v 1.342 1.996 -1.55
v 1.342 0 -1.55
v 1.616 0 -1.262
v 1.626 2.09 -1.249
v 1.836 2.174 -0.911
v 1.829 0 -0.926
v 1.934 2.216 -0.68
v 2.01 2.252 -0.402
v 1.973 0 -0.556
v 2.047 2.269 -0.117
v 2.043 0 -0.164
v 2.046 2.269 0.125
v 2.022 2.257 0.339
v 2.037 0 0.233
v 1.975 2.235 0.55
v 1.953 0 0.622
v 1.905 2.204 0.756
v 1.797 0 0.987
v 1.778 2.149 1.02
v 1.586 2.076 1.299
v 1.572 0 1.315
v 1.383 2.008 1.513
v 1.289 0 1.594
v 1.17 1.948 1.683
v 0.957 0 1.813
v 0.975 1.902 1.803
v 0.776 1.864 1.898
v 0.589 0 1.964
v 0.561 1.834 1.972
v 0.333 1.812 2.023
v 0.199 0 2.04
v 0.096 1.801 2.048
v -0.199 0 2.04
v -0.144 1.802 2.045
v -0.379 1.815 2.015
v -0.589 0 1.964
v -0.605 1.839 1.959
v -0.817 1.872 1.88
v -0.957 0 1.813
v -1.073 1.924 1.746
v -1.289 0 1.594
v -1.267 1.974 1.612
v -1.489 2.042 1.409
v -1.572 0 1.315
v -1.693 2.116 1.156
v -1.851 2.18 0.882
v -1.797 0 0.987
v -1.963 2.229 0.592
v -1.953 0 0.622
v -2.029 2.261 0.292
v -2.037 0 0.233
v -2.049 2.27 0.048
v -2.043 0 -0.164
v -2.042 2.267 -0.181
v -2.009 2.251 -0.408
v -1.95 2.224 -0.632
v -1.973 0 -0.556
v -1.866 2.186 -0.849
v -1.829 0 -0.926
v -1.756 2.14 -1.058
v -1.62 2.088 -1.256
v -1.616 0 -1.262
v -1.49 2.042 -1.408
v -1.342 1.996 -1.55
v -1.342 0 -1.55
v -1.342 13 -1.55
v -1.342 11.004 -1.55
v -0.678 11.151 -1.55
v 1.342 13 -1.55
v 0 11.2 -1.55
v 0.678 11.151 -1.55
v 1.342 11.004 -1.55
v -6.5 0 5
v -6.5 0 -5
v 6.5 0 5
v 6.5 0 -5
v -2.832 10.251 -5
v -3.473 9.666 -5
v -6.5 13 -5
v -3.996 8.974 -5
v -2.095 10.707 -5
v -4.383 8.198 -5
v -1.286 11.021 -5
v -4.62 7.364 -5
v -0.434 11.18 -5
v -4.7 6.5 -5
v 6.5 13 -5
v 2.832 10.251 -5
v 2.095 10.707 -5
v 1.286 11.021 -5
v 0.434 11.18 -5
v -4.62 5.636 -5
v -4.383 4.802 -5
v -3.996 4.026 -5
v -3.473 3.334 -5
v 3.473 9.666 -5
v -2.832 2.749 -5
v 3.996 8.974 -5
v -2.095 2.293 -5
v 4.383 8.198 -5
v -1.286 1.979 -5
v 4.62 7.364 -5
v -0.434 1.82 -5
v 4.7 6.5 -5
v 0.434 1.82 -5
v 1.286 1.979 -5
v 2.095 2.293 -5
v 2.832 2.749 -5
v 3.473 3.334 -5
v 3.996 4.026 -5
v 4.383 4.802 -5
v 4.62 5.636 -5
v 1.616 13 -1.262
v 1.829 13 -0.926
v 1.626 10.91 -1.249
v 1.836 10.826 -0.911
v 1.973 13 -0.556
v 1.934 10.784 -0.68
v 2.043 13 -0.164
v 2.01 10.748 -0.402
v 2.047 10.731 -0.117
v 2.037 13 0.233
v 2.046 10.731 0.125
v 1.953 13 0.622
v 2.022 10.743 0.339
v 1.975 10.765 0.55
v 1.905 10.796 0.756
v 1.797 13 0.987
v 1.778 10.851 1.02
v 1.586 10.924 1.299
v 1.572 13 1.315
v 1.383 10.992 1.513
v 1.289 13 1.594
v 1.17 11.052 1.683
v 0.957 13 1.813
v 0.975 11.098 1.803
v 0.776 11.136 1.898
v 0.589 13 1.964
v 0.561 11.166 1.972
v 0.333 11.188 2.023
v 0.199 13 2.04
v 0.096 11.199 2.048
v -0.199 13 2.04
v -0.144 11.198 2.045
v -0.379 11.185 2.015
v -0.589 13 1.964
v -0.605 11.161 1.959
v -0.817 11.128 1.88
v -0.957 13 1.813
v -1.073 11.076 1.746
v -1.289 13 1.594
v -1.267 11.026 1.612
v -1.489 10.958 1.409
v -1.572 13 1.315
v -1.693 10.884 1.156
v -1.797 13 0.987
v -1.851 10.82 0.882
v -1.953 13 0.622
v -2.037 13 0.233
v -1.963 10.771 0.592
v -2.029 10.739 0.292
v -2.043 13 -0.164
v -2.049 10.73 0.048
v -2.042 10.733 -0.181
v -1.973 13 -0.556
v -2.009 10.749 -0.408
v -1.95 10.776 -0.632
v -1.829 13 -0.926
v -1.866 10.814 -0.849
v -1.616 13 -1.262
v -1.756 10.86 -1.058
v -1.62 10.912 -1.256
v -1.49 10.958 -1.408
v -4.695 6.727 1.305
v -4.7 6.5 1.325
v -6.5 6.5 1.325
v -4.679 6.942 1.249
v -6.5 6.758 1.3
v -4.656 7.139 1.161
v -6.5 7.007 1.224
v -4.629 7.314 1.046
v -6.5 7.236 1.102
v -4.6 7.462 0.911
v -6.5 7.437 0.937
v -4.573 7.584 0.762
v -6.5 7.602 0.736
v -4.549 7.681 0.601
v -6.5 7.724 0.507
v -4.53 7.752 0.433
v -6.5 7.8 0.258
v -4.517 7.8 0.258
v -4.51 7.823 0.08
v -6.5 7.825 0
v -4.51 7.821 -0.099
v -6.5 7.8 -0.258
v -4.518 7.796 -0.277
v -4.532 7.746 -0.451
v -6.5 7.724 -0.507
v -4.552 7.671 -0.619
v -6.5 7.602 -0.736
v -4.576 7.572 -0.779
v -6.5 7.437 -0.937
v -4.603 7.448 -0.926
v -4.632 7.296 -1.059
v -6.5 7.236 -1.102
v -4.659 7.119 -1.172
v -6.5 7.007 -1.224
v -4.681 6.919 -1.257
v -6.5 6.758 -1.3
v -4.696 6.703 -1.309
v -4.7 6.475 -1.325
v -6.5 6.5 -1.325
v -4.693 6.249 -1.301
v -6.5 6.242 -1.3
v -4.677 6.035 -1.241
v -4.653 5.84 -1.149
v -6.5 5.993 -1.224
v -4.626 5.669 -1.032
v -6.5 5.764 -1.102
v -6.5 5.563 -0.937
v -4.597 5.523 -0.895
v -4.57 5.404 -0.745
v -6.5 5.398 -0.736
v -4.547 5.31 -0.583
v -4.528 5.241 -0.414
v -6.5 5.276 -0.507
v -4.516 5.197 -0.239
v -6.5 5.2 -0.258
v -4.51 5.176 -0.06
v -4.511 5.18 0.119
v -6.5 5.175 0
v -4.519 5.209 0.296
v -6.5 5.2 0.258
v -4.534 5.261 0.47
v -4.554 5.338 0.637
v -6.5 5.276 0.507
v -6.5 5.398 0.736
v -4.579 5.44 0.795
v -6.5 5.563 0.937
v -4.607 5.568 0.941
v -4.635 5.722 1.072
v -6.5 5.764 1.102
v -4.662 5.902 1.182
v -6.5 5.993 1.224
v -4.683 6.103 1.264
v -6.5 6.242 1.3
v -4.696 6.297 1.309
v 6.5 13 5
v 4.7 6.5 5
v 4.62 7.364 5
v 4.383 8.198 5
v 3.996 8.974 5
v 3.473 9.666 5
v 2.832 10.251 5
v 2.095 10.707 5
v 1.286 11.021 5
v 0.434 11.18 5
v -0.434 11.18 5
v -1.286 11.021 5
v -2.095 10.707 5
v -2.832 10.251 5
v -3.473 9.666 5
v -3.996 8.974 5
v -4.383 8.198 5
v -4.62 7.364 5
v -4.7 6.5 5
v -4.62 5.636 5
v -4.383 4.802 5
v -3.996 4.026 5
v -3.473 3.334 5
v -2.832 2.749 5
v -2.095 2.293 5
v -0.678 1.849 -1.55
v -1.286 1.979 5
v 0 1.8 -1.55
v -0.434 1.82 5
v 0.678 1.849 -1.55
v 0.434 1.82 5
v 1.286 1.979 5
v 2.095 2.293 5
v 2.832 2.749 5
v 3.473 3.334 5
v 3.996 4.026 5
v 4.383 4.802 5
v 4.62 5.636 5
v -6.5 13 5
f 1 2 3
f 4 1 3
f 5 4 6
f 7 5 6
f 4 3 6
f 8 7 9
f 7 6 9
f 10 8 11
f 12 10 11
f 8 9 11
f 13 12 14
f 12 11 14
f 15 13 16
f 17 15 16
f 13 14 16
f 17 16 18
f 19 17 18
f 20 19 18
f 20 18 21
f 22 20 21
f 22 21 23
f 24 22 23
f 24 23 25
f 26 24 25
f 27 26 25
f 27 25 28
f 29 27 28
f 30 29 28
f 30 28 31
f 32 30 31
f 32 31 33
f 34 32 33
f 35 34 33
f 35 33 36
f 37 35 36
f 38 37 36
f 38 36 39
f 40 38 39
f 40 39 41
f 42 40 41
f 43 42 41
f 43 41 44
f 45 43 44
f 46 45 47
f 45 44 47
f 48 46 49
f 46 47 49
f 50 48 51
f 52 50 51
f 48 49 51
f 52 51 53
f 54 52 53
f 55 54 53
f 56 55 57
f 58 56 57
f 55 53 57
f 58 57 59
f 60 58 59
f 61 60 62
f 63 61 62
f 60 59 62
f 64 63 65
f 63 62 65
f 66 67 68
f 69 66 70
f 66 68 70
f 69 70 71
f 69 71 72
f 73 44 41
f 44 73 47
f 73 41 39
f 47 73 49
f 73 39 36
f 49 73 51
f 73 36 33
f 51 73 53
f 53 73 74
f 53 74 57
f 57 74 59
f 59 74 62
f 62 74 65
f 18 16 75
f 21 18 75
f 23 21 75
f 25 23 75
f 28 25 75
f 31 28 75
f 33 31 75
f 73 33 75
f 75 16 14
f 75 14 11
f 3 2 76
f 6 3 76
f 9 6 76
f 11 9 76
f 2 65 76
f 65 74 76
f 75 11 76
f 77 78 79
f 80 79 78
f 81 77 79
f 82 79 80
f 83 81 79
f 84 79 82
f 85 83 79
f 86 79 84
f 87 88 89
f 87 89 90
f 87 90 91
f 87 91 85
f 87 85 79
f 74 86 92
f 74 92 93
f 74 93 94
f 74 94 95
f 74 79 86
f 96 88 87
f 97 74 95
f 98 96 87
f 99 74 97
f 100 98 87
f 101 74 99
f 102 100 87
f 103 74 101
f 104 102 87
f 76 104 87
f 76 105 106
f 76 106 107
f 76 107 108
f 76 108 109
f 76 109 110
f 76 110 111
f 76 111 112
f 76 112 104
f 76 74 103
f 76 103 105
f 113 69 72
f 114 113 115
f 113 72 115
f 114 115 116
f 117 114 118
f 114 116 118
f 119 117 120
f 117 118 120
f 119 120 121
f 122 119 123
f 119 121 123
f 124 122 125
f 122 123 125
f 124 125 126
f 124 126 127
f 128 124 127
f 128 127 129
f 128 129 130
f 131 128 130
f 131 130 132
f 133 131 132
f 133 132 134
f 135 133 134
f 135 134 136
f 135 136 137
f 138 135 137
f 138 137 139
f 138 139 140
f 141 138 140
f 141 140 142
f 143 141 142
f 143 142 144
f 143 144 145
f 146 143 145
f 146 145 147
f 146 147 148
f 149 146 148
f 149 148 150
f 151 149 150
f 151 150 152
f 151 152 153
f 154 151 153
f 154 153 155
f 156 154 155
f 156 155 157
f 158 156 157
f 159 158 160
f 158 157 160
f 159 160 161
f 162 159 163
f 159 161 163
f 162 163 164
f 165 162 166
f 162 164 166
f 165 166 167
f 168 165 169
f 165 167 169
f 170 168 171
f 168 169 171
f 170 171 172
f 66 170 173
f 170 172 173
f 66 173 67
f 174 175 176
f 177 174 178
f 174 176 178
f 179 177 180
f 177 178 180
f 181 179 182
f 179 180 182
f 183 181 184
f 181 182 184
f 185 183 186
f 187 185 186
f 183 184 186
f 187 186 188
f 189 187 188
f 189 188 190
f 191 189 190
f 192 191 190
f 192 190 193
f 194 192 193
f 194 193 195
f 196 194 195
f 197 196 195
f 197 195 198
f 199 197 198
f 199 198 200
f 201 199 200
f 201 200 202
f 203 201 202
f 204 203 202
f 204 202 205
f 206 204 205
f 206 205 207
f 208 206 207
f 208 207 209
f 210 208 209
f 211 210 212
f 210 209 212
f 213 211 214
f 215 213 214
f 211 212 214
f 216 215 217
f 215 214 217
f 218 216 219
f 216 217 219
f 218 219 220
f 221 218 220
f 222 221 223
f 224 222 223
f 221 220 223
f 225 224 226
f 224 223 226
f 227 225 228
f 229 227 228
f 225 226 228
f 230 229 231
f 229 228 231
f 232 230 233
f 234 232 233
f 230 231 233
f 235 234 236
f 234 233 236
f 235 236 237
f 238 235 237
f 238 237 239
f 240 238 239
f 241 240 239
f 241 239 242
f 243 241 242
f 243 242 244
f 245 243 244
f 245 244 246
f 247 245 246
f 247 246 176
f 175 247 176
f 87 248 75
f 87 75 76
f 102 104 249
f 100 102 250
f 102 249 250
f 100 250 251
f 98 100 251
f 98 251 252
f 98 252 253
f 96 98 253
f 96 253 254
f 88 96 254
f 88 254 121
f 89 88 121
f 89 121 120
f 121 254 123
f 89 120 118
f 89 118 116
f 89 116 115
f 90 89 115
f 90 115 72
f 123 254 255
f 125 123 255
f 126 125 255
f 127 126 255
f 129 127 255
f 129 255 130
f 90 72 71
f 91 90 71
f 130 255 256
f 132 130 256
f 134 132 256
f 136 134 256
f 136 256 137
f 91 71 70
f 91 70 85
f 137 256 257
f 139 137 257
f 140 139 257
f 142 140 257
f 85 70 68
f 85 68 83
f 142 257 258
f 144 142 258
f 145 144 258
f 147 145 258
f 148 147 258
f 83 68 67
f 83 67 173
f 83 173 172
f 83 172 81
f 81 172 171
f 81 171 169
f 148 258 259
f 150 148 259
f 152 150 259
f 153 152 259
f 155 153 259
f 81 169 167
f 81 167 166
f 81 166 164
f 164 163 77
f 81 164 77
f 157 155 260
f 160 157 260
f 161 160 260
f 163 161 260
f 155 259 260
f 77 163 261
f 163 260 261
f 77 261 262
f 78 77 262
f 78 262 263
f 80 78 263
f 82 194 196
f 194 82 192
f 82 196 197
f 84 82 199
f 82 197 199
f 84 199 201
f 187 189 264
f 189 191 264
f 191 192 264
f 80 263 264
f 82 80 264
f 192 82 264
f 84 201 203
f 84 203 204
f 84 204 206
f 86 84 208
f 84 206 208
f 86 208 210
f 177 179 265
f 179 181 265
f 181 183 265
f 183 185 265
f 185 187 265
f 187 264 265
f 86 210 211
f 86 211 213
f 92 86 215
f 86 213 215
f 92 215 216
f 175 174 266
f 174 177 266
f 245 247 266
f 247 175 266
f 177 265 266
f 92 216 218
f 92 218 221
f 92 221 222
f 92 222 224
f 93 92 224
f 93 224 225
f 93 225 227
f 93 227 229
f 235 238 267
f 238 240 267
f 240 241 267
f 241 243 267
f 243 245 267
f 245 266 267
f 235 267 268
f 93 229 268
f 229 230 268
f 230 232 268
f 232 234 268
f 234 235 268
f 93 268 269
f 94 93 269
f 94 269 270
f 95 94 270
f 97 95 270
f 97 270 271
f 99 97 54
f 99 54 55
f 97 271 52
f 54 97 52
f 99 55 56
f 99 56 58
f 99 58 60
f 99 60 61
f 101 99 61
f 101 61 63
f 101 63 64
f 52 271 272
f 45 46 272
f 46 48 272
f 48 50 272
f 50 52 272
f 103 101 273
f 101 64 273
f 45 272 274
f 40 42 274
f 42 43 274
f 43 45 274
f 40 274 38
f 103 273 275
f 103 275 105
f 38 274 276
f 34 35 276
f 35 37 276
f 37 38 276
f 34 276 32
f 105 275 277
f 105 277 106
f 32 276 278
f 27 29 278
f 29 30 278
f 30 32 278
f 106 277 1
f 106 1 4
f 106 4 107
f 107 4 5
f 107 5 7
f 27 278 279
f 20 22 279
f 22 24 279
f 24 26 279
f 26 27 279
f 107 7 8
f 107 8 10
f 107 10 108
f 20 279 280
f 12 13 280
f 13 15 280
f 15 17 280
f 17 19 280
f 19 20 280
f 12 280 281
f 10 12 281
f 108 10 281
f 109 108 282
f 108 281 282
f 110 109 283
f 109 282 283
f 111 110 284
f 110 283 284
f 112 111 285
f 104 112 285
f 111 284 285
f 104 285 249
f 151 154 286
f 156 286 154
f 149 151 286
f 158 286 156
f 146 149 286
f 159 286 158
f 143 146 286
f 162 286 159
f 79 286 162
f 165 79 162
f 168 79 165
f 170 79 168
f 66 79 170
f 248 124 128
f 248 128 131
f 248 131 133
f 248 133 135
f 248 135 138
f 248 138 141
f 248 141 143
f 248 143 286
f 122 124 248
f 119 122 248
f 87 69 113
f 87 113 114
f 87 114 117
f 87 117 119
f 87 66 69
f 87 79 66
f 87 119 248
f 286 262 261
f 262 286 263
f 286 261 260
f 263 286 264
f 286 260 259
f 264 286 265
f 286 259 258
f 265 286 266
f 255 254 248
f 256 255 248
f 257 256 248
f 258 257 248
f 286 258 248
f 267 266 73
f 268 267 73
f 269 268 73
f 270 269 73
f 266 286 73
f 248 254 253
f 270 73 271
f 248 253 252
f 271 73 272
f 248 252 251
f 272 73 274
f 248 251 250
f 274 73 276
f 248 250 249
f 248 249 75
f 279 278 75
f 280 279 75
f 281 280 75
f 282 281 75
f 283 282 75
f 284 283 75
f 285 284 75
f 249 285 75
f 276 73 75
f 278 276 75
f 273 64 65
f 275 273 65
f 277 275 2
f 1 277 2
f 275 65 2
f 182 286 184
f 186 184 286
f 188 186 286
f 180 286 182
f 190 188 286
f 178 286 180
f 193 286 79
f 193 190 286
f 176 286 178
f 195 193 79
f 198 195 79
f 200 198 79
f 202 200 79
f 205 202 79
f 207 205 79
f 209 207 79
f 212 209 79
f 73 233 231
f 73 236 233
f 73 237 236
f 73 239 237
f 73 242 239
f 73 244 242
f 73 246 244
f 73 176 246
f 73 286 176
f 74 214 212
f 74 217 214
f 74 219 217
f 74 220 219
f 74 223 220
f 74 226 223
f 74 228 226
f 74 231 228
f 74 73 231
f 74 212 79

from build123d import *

# Parameters (mm, degrees)
SKETCH1_W           = 13
SKETCH1_H           = 10
BOSS_EXTRUDE1_DEPTH = 13
SKETCH2_R           = 4.7
CUT_EXTRUDE1_DEPTH  = 10
CUT_EXTRUDE2_REACH  = 15
SKETCH3_R           = 1.325


with BuildPart() as part:
    # Sketch1 → Boss-Extrude1 (new body)
    with BuildSketch(Plane(origin=(0, 0, 0), x_dir=(1, 0, 0), z_dir=(0, 1, 0))):
        Rectangle(SKETCH1_W, SKETCH1_H)
        with BuildLine():
            Line((-1.341640786, 1.55), (1.341640786, 1.55))
            ThreePointArc((1.341640786, 1.55), (0, -2.05), (-1.341640786, 1.55))
        make_face(mode=Mode.SUBTRACT)
    extrude(amount=BOSS_EXTRUDE1_DEPTH)

    # Sketch2 → Cut-Extrude1 (cut)
    with BuildSketch(Plane.XY.offset(5)):
        with Locations((0, 6.5)):
            Circle(SKETCH2_R)
    extrude(amount=-CUT_EXTRUDE1_DEPTH, mode=Mode.SUBTRACT)

    # Sketch3 → Cut-Extrude2 (cut, up to next)
    with BuildSketch(Plane.ZY.offset(6.5), mode=Mode.PRIVATE) as cut_extrude2_sk1:
        with Locations((0, 6.5)):
            Circle(SKETCH3_R)
    cut_extrude2_tool1 = extrude(cut_extrude2_sk1.sketch, amount=-CUT_EXTRUDE2_REACH, mode=Mode.PRIVATE) & part.part
    add(cut_extrude2_tool1.solids().sort_by_distance((-6.5, 6.5, 0))[0], mode=Mode.SUBTRACT)


solid = part.part
